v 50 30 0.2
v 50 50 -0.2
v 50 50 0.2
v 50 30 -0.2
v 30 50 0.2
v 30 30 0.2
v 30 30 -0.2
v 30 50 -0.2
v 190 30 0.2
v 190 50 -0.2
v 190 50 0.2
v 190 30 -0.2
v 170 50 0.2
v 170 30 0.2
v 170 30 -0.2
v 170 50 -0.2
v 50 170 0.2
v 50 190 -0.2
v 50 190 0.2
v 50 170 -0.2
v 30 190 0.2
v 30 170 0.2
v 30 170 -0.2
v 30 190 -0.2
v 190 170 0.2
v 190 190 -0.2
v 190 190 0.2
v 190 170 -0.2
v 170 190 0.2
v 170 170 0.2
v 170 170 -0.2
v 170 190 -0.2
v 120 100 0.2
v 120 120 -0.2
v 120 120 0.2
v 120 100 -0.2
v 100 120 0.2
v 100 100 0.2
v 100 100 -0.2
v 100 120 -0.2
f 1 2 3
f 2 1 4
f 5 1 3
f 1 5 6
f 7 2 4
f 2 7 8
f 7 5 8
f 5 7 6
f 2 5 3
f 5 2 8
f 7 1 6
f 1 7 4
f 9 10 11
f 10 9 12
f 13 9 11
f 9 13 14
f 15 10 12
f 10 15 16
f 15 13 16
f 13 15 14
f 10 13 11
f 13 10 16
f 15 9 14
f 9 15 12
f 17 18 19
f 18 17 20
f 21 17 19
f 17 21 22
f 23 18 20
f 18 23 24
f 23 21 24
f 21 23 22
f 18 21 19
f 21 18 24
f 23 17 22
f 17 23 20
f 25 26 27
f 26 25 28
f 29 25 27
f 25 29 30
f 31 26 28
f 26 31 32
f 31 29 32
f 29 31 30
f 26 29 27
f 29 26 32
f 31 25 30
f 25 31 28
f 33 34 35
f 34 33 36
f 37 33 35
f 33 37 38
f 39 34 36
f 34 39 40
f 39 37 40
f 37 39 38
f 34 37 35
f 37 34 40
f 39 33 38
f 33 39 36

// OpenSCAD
BX=220; //Bed X dimension in mm
BY=220; //Bed Y dimension in mm
LH=.4; //Initial layer height
SQ=20; //Size of square pads
OFF=30; //Offset from edges in mm
module Target(){
    cube([SQ,SQ,LH],center=true);
}
MFact = OFF+SQ/2;
MX = BX-MFact;
MY = BY-MFact;
translate([MFact,MFact,0])Target();
translate([MX,MFact,0])Target();
translate([MFact,MY,0])Target();
translate([MX,MY,0])Target();
translate([BX/2,BY/2,0])Target();
